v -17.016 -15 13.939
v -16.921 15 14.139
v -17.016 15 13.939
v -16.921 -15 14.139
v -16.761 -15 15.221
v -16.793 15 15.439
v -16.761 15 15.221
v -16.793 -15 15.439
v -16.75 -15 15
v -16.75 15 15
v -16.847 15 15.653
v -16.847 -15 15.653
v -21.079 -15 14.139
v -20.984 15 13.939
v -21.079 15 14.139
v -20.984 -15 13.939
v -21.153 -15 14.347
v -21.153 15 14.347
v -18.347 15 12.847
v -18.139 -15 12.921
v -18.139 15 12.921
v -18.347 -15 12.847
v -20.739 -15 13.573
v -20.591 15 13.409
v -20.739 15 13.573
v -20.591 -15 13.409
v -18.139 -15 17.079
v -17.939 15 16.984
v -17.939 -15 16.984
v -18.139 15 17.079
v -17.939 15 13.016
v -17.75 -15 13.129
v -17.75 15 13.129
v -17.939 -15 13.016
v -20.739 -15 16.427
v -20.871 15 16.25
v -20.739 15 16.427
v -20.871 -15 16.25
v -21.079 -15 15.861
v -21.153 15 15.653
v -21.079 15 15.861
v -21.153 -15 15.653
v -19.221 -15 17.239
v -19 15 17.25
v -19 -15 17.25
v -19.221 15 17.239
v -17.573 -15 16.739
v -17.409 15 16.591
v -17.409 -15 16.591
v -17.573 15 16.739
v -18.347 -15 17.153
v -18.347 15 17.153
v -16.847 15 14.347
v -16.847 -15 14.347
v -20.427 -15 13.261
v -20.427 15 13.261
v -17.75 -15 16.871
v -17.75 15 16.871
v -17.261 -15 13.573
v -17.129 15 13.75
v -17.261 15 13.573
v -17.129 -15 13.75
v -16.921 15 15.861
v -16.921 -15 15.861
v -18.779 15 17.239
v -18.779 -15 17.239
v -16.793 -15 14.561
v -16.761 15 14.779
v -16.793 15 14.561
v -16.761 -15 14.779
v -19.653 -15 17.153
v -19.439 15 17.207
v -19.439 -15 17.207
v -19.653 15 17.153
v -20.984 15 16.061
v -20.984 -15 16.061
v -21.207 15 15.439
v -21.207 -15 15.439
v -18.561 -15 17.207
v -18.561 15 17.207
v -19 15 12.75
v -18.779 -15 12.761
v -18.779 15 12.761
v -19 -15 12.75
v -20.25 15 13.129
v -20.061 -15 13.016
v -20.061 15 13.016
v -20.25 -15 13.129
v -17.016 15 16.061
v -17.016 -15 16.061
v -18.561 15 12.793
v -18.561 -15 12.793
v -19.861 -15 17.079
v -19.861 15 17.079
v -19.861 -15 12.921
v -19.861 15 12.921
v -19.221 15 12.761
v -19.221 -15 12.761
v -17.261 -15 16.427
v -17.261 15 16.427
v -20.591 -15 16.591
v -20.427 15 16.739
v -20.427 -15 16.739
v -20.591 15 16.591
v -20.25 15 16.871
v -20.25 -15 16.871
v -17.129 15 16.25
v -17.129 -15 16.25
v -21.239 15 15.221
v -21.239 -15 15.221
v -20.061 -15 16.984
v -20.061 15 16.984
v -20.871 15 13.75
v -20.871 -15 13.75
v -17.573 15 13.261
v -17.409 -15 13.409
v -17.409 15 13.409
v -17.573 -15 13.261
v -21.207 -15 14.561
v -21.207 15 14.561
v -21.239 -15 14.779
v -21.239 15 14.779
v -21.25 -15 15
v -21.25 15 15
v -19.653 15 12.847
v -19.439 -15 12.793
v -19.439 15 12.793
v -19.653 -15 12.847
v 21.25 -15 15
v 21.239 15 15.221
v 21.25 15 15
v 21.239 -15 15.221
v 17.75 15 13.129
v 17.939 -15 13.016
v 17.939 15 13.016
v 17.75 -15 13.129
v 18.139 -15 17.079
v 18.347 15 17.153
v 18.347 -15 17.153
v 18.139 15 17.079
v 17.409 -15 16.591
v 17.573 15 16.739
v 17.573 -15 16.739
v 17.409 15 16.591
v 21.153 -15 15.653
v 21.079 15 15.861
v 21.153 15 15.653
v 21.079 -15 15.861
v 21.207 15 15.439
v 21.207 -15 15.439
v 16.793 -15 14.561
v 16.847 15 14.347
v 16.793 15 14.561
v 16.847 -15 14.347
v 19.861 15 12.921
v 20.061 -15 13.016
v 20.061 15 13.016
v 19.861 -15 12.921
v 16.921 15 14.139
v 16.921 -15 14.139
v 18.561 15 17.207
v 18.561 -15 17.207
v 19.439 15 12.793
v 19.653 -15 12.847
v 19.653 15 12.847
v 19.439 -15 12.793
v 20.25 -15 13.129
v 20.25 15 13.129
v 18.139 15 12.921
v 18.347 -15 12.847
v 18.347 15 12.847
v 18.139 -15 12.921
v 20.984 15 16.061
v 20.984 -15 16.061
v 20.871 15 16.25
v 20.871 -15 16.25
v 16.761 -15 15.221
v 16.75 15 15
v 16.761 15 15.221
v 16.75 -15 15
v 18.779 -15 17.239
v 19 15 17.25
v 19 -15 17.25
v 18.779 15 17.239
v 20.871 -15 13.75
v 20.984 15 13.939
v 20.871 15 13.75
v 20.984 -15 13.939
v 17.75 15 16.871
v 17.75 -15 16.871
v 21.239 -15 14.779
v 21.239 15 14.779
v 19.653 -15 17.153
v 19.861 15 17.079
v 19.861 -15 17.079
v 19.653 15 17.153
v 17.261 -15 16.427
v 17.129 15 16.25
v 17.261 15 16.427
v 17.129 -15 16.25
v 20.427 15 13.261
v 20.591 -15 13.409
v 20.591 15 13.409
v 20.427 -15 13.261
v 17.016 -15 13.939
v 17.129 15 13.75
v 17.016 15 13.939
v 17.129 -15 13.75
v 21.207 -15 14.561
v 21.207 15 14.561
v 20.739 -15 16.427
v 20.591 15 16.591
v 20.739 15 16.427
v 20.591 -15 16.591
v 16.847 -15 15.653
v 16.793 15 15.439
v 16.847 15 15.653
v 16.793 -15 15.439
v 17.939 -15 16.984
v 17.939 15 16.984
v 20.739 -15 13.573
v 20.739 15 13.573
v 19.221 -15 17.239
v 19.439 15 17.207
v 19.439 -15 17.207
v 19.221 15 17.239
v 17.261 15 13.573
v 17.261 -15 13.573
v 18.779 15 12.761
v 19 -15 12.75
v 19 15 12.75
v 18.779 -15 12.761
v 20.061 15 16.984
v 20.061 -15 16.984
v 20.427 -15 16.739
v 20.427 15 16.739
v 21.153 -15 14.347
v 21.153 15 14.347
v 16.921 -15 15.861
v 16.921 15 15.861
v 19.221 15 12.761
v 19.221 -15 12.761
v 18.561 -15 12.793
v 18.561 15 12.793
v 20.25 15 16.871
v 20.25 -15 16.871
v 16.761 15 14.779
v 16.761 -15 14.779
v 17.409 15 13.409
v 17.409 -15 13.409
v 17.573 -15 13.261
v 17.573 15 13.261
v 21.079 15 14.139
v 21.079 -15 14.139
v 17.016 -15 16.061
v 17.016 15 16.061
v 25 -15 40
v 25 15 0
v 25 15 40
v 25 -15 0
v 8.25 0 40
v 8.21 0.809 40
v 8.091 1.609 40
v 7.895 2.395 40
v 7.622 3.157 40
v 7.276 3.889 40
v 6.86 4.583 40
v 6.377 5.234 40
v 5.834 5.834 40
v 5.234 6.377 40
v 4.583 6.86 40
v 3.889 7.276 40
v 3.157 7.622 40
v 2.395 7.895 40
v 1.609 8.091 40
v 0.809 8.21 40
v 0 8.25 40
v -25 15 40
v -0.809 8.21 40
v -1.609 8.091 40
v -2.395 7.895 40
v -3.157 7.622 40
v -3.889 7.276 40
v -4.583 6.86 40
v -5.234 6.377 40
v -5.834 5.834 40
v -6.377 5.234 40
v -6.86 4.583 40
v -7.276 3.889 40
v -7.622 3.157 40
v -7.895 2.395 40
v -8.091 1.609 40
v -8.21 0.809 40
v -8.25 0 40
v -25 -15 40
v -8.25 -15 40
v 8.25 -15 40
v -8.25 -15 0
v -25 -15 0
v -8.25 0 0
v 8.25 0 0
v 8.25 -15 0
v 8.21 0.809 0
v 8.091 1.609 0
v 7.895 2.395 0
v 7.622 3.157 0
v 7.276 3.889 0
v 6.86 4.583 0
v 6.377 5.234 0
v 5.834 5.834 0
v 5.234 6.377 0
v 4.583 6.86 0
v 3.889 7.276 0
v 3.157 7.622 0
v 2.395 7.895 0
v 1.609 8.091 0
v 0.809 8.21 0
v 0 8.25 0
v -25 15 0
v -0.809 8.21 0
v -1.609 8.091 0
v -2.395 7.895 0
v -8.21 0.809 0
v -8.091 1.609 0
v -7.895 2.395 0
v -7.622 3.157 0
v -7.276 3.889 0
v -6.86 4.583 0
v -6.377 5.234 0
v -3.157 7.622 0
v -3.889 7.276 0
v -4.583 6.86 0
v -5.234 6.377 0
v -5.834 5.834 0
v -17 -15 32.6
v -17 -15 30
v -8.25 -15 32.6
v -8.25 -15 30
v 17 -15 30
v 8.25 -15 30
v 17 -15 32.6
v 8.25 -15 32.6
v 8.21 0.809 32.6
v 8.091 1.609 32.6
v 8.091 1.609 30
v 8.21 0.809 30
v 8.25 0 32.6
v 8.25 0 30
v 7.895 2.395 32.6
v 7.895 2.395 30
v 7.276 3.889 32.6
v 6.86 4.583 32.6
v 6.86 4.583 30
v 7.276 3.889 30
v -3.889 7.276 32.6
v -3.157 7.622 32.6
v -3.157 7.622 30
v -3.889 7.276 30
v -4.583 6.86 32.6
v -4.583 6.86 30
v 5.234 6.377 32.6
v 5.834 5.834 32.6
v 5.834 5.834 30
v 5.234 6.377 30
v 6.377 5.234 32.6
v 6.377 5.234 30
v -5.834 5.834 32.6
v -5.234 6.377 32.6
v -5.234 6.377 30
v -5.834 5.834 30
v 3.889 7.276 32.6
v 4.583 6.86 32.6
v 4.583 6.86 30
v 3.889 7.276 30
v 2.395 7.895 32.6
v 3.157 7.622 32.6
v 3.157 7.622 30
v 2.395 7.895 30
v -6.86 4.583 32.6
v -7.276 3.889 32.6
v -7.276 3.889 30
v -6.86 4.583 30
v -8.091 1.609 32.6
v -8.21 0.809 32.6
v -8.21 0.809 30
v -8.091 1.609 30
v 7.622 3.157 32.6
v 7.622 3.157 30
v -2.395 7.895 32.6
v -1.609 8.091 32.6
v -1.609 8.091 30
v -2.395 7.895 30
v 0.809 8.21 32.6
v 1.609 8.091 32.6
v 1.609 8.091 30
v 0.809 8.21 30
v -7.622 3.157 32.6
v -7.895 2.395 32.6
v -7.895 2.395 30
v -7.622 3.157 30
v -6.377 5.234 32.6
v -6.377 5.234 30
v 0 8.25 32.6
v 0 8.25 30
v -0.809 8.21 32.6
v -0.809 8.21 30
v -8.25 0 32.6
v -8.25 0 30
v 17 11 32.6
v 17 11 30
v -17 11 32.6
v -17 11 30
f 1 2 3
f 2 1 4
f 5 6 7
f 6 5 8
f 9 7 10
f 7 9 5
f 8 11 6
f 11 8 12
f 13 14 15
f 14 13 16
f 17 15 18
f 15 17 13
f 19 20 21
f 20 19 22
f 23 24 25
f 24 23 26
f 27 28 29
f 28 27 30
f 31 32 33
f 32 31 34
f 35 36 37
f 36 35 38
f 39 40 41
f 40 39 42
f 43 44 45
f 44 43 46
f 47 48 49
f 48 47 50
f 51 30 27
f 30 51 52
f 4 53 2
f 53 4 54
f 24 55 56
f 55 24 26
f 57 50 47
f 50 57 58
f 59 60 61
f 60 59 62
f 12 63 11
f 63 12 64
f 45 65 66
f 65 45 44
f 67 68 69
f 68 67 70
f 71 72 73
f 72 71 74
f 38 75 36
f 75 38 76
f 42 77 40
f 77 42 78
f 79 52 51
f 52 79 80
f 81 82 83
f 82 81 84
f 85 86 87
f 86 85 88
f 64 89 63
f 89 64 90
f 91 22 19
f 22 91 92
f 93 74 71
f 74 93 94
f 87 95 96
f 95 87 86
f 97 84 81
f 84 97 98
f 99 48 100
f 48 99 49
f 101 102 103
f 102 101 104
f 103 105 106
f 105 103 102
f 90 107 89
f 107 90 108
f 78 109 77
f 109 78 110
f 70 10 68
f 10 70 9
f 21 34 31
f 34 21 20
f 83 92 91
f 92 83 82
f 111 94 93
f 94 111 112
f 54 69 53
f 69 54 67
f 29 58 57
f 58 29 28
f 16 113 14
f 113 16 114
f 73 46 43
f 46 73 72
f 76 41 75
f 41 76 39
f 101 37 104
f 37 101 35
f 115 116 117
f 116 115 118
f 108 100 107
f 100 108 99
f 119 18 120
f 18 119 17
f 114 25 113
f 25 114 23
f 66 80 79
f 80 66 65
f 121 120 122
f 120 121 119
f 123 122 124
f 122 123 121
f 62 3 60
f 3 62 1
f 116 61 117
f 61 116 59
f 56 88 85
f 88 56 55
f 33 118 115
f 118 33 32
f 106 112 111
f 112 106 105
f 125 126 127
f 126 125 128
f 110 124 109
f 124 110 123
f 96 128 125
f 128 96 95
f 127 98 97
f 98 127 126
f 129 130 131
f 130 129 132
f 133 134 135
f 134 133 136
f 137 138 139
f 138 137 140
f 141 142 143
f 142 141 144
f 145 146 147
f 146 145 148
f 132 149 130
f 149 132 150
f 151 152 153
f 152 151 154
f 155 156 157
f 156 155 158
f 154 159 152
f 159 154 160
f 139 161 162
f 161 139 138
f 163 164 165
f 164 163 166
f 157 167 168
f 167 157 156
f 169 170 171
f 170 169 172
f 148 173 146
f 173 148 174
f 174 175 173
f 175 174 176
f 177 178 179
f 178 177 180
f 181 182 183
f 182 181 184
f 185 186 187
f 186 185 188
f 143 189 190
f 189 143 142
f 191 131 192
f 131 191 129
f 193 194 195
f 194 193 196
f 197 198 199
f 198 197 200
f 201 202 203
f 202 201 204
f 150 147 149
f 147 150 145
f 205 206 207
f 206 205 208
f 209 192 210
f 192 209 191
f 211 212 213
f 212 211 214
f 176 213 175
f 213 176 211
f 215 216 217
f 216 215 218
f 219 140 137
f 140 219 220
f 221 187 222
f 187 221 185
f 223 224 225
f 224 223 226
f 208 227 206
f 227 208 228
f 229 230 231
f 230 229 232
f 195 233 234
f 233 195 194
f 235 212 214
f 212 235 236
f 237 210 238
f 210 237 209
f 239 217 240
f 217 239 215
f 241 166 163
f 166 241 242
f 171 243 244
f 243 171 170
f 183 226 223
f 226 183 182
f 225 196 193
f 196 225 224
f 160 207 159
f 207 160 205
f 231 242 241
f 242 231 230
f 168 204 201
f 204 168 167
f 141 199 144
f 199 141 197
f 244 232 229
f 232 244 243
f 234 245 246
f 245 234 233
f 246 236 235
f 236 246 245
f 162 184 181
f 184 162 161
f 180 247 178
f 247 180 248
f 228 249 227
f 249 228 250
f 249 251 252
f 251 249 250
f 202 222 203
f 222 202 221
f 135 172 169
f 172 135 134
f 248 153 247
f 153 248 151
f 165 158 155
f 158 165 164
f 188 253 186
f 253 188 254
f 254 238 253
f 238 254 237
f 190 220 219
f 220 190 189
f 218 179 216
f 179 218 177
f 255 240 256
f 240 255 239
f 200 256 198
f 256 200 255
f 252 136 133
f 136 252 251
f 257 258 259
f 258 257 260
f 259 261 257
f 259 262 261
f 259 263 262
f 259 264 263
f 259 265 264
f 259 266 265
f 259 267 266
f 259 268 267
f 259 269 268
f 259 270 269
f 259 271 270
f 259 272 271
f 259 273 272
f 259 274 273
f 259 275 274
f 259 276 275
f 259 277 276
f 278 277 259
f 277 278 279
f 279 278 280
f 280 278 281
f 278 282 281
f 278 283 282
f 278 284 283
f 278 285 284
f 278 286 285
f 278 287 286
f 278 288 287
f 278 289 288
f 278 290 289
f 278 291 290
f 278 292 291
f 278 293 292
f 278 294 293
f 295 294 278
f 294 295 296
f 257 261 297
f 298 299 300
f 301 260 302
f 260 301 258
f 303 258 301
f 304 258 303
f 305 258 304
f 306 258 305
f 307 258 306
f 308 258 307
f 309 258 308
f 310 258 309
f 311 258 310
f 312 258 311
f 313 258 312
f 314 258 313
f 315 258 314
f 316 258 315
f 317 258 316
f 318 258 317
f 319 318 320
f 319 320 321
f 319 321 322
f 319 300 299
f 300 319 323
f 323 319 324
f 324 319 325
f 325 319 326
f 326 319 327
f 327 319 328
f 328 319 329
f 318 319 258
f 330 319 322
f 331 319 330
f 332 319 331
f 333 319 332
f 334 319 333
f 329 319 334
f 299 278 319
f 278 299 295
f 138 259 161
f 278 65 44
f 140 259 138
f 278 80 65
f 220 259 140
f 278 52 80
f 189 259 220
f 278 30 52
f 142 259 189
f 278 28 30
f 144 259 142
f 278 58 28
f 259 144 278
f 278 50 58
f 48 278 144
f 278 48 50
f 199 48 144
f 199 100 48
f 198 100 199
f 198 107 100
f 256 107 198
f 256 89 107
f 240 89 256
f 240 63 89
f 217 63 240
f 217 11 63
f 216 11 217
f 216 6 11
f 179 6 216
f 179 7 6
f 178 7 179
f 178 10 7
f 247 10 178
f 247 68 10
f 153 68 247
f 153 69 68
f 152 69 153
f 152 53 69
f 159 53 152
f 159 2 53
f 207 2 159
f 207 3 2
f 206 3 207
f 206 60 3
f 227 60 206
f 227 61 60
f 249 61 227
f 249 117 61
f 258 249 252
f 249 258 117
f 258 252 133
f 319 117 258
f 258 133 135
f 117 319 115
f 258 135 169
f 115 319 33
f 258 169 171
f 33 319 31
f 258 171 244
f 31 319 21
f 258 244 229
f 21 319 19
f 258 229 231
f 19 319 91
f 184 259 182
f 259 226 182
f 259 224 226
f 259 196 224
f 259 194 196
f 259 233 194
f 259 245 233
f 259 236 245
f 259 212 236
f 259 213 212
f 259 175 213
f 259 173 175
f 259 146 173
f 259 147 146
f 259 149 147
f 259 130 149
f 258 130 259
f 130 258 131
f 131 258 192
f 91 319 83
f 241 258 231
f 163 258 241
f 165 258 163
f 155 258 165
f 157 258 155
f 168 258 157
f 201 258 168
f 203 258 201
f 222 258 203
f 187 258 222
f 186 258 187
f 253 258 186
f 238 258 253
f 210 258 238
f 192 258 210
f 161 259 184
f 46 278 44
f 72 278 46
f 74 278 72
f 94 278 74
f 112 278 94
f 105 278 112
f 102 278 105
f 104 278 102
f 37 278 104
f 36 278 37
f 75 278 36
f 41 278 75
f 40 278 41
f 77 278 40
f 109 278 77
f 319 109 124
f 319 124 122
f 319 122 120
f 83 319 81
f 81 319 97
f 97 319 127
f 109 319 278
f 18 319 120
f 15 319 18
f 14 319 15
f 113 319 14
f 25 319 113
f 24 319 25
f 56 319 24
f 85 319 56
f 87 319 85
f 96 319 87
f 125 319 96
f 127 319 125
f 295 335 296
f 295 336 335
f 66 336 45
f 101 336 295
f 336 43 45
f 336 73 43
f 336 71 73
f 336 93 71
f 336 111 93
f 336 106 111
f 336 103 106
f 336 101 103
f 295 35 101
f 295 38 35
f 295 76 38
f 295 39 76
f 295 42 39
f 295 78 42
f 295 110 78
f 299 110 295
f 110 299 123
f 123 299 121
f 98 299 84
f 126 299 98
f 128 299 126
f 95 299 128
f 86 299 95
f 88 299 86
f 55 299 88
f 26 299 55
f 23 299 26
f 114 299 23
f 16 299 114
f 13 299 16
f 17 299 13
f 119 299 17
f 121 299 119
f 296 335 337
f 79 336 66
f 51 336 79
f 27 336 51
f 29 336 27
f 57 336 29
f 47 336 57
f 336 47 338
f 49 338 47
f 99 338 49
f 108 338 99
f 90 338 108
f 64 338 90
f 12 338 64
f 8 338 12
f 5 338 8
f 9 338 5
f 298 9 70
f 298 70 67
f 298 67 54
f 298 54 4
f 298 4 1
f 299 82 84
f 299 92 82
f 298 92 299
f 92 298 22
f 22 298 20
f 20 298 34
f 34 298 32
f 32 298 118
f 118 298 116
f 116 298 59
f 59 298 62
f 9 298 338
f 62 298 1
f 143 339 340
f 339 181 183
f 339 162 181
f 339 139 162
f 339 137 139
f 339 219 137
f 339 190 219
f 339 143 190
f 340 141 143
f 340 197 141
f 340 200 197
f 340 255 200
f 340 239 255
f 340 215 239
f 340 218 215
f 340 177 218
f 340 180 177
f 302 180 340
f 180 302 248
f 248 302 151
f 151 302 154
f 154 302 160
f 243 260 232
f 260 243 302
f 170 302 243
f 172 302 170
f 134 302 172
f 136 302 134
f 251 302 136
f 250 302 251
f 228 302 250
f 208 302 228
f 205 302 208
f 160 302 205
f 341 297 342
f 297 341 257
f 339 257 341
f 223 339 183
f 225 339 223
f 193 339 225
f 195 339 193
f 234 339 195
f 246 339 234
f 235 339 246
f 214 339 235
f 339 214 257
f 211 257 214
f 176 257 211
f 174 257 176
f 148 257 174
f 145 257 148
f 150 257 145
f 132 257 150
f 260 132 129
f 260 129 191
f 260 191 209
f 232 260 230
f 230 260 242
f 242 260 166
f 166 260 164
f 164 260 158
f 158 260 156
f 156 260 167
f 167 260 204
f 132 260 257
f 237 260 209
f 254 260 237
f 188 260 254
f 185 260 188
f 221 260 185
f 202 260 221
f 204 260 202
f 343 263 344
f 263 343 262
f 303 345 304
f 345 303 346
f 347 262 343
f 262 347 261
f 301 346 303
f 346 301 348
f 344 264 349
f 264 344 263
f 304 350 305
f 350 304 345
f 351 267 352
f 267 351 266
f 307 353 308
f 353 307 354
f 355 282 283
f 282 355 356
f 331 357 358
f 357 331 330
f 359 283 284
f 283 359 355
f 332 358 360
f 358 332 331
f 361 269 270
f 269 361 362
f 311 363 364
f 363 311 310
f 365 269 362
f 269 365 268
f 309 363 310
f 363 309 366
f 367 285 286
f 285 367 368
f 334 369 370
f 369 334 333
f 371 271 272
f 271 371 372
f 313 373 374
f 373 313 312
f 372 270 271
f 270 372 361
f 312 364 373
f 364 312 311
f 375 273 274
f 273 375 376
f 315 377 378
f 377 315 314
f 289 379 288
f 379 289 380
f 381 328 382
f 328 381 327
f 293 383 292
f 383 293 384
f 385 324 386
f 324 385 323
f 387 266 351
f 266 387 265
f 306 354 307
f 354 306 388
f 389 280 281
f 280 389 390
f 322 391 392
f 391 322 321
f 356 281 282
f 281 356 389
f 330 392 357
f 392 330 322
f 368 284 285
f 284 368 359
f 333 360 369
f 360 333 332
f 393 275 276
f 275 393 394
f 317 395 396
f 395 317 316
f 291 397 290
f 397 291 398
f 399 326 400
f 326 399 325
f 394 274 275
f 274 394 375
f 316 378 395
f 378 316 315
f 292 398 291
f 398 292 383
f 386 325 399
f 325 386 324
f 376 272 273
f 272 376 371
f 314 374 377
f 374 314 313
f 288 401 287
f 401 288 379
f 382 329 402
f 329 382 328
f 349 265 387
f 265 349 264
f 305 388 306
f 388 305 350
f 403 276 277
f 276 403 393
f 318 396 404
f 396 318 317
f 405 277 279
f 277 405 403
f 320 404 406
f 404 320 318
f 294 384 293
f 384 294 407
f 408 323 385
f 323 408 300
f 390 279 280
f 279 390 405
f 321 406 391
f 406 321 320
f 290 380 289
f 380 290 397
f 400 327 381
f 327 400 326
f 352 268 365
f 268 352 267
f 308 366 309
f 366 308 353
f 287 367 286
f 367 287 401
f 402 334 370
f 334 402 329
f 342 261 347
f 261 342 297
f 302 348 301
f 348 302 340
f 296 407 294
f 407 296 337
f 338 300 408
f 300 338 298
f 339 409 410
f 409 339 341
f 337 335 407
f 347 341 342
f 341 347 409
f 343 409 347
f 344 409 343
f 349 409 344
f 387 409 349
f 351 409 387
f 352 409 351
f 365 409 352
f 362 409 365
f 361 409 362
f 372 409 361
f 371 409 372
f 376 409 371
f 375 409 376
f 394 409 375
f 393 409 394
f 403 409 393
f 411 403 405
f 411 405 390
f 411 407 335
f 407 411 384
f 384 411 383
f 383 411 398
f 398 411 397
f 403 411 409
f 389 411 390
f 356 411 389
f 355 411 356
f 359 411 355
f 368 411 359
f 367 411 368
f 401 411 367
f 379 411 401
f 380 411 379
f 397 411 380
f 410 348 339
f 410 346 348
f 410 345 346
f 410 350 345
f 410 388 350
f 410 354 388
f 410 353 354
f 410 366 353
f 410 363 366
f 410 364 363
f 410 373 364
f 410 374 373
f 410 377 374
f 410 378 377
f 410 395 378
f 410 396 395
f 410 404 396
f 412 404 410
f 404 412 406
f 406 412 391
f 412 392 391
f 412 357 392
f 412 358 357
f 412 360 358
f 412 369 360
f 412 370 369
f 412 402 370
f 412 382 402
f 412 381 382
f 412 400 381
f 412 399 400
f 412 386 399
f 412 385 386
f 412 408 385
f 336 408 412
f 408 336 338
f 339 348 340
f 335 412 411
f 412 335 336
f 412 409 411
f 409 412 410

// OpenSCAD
// Wall-mounted 10 mL syringe holder (tip down, printed as used)

$fn = 64;

// Block
block_w = 50;        // X width
block_d = 30;        // Y depth
block_h = 40;        // Z height

// Barrel channel
channel_w = 16.5;    // channel width (X)
channel_r = channel_w / 2; // back half-circle radius (8.25)
channel_cx = 0;      // circle centre X
channel_cy = 0;      // circle centre Y

// Flange slot
slot_w = 34;         // X width, centred
slot_z0 = 30;        // slot bottom Z
slot_h = 2.6;        // slot height
slot_back_y = 11;    // slot back end Y

// Screw holes
screw_d = 4.5;       // M4 clearance hole diameter
screw_x = 19;        // +/- X position
screw_z = 15;        // Z position

eps = 1;             // cutter overshoot

difference() {
    // Main block
    translate([-block_w/2, -block_d/2, 0])
        cube([block_w, block_d, block_h]);

    // Barrel channel: half-circle back end + straight sides to front
    translate([channel_cx, channel_cy, -eps])
        cylinder(r = channel_r, h = block_h + 2*eps);
    translate([channel_cx - channel_r, -block_d/2 - eps, -eps])
        cube([channel_w, block_d/2 + eps + channel_cy, block_h + 2*eps]);

    // Flange slot, open to the front face
    translate([-slot_w/2, -block_d/2 - eps, slot_z0])
        cube([slot_w, (slot_back_y + block_d/2) + eps, slot_h]);

    // Screw holes through along Y
    for (sx = [-screw_x, screw_x])
        translate([sx, 0, screw_z])
            rotate([90, 0, 0])
                cylinder(d = screw_d, h = block_d + 2*eps, center = true);
}
